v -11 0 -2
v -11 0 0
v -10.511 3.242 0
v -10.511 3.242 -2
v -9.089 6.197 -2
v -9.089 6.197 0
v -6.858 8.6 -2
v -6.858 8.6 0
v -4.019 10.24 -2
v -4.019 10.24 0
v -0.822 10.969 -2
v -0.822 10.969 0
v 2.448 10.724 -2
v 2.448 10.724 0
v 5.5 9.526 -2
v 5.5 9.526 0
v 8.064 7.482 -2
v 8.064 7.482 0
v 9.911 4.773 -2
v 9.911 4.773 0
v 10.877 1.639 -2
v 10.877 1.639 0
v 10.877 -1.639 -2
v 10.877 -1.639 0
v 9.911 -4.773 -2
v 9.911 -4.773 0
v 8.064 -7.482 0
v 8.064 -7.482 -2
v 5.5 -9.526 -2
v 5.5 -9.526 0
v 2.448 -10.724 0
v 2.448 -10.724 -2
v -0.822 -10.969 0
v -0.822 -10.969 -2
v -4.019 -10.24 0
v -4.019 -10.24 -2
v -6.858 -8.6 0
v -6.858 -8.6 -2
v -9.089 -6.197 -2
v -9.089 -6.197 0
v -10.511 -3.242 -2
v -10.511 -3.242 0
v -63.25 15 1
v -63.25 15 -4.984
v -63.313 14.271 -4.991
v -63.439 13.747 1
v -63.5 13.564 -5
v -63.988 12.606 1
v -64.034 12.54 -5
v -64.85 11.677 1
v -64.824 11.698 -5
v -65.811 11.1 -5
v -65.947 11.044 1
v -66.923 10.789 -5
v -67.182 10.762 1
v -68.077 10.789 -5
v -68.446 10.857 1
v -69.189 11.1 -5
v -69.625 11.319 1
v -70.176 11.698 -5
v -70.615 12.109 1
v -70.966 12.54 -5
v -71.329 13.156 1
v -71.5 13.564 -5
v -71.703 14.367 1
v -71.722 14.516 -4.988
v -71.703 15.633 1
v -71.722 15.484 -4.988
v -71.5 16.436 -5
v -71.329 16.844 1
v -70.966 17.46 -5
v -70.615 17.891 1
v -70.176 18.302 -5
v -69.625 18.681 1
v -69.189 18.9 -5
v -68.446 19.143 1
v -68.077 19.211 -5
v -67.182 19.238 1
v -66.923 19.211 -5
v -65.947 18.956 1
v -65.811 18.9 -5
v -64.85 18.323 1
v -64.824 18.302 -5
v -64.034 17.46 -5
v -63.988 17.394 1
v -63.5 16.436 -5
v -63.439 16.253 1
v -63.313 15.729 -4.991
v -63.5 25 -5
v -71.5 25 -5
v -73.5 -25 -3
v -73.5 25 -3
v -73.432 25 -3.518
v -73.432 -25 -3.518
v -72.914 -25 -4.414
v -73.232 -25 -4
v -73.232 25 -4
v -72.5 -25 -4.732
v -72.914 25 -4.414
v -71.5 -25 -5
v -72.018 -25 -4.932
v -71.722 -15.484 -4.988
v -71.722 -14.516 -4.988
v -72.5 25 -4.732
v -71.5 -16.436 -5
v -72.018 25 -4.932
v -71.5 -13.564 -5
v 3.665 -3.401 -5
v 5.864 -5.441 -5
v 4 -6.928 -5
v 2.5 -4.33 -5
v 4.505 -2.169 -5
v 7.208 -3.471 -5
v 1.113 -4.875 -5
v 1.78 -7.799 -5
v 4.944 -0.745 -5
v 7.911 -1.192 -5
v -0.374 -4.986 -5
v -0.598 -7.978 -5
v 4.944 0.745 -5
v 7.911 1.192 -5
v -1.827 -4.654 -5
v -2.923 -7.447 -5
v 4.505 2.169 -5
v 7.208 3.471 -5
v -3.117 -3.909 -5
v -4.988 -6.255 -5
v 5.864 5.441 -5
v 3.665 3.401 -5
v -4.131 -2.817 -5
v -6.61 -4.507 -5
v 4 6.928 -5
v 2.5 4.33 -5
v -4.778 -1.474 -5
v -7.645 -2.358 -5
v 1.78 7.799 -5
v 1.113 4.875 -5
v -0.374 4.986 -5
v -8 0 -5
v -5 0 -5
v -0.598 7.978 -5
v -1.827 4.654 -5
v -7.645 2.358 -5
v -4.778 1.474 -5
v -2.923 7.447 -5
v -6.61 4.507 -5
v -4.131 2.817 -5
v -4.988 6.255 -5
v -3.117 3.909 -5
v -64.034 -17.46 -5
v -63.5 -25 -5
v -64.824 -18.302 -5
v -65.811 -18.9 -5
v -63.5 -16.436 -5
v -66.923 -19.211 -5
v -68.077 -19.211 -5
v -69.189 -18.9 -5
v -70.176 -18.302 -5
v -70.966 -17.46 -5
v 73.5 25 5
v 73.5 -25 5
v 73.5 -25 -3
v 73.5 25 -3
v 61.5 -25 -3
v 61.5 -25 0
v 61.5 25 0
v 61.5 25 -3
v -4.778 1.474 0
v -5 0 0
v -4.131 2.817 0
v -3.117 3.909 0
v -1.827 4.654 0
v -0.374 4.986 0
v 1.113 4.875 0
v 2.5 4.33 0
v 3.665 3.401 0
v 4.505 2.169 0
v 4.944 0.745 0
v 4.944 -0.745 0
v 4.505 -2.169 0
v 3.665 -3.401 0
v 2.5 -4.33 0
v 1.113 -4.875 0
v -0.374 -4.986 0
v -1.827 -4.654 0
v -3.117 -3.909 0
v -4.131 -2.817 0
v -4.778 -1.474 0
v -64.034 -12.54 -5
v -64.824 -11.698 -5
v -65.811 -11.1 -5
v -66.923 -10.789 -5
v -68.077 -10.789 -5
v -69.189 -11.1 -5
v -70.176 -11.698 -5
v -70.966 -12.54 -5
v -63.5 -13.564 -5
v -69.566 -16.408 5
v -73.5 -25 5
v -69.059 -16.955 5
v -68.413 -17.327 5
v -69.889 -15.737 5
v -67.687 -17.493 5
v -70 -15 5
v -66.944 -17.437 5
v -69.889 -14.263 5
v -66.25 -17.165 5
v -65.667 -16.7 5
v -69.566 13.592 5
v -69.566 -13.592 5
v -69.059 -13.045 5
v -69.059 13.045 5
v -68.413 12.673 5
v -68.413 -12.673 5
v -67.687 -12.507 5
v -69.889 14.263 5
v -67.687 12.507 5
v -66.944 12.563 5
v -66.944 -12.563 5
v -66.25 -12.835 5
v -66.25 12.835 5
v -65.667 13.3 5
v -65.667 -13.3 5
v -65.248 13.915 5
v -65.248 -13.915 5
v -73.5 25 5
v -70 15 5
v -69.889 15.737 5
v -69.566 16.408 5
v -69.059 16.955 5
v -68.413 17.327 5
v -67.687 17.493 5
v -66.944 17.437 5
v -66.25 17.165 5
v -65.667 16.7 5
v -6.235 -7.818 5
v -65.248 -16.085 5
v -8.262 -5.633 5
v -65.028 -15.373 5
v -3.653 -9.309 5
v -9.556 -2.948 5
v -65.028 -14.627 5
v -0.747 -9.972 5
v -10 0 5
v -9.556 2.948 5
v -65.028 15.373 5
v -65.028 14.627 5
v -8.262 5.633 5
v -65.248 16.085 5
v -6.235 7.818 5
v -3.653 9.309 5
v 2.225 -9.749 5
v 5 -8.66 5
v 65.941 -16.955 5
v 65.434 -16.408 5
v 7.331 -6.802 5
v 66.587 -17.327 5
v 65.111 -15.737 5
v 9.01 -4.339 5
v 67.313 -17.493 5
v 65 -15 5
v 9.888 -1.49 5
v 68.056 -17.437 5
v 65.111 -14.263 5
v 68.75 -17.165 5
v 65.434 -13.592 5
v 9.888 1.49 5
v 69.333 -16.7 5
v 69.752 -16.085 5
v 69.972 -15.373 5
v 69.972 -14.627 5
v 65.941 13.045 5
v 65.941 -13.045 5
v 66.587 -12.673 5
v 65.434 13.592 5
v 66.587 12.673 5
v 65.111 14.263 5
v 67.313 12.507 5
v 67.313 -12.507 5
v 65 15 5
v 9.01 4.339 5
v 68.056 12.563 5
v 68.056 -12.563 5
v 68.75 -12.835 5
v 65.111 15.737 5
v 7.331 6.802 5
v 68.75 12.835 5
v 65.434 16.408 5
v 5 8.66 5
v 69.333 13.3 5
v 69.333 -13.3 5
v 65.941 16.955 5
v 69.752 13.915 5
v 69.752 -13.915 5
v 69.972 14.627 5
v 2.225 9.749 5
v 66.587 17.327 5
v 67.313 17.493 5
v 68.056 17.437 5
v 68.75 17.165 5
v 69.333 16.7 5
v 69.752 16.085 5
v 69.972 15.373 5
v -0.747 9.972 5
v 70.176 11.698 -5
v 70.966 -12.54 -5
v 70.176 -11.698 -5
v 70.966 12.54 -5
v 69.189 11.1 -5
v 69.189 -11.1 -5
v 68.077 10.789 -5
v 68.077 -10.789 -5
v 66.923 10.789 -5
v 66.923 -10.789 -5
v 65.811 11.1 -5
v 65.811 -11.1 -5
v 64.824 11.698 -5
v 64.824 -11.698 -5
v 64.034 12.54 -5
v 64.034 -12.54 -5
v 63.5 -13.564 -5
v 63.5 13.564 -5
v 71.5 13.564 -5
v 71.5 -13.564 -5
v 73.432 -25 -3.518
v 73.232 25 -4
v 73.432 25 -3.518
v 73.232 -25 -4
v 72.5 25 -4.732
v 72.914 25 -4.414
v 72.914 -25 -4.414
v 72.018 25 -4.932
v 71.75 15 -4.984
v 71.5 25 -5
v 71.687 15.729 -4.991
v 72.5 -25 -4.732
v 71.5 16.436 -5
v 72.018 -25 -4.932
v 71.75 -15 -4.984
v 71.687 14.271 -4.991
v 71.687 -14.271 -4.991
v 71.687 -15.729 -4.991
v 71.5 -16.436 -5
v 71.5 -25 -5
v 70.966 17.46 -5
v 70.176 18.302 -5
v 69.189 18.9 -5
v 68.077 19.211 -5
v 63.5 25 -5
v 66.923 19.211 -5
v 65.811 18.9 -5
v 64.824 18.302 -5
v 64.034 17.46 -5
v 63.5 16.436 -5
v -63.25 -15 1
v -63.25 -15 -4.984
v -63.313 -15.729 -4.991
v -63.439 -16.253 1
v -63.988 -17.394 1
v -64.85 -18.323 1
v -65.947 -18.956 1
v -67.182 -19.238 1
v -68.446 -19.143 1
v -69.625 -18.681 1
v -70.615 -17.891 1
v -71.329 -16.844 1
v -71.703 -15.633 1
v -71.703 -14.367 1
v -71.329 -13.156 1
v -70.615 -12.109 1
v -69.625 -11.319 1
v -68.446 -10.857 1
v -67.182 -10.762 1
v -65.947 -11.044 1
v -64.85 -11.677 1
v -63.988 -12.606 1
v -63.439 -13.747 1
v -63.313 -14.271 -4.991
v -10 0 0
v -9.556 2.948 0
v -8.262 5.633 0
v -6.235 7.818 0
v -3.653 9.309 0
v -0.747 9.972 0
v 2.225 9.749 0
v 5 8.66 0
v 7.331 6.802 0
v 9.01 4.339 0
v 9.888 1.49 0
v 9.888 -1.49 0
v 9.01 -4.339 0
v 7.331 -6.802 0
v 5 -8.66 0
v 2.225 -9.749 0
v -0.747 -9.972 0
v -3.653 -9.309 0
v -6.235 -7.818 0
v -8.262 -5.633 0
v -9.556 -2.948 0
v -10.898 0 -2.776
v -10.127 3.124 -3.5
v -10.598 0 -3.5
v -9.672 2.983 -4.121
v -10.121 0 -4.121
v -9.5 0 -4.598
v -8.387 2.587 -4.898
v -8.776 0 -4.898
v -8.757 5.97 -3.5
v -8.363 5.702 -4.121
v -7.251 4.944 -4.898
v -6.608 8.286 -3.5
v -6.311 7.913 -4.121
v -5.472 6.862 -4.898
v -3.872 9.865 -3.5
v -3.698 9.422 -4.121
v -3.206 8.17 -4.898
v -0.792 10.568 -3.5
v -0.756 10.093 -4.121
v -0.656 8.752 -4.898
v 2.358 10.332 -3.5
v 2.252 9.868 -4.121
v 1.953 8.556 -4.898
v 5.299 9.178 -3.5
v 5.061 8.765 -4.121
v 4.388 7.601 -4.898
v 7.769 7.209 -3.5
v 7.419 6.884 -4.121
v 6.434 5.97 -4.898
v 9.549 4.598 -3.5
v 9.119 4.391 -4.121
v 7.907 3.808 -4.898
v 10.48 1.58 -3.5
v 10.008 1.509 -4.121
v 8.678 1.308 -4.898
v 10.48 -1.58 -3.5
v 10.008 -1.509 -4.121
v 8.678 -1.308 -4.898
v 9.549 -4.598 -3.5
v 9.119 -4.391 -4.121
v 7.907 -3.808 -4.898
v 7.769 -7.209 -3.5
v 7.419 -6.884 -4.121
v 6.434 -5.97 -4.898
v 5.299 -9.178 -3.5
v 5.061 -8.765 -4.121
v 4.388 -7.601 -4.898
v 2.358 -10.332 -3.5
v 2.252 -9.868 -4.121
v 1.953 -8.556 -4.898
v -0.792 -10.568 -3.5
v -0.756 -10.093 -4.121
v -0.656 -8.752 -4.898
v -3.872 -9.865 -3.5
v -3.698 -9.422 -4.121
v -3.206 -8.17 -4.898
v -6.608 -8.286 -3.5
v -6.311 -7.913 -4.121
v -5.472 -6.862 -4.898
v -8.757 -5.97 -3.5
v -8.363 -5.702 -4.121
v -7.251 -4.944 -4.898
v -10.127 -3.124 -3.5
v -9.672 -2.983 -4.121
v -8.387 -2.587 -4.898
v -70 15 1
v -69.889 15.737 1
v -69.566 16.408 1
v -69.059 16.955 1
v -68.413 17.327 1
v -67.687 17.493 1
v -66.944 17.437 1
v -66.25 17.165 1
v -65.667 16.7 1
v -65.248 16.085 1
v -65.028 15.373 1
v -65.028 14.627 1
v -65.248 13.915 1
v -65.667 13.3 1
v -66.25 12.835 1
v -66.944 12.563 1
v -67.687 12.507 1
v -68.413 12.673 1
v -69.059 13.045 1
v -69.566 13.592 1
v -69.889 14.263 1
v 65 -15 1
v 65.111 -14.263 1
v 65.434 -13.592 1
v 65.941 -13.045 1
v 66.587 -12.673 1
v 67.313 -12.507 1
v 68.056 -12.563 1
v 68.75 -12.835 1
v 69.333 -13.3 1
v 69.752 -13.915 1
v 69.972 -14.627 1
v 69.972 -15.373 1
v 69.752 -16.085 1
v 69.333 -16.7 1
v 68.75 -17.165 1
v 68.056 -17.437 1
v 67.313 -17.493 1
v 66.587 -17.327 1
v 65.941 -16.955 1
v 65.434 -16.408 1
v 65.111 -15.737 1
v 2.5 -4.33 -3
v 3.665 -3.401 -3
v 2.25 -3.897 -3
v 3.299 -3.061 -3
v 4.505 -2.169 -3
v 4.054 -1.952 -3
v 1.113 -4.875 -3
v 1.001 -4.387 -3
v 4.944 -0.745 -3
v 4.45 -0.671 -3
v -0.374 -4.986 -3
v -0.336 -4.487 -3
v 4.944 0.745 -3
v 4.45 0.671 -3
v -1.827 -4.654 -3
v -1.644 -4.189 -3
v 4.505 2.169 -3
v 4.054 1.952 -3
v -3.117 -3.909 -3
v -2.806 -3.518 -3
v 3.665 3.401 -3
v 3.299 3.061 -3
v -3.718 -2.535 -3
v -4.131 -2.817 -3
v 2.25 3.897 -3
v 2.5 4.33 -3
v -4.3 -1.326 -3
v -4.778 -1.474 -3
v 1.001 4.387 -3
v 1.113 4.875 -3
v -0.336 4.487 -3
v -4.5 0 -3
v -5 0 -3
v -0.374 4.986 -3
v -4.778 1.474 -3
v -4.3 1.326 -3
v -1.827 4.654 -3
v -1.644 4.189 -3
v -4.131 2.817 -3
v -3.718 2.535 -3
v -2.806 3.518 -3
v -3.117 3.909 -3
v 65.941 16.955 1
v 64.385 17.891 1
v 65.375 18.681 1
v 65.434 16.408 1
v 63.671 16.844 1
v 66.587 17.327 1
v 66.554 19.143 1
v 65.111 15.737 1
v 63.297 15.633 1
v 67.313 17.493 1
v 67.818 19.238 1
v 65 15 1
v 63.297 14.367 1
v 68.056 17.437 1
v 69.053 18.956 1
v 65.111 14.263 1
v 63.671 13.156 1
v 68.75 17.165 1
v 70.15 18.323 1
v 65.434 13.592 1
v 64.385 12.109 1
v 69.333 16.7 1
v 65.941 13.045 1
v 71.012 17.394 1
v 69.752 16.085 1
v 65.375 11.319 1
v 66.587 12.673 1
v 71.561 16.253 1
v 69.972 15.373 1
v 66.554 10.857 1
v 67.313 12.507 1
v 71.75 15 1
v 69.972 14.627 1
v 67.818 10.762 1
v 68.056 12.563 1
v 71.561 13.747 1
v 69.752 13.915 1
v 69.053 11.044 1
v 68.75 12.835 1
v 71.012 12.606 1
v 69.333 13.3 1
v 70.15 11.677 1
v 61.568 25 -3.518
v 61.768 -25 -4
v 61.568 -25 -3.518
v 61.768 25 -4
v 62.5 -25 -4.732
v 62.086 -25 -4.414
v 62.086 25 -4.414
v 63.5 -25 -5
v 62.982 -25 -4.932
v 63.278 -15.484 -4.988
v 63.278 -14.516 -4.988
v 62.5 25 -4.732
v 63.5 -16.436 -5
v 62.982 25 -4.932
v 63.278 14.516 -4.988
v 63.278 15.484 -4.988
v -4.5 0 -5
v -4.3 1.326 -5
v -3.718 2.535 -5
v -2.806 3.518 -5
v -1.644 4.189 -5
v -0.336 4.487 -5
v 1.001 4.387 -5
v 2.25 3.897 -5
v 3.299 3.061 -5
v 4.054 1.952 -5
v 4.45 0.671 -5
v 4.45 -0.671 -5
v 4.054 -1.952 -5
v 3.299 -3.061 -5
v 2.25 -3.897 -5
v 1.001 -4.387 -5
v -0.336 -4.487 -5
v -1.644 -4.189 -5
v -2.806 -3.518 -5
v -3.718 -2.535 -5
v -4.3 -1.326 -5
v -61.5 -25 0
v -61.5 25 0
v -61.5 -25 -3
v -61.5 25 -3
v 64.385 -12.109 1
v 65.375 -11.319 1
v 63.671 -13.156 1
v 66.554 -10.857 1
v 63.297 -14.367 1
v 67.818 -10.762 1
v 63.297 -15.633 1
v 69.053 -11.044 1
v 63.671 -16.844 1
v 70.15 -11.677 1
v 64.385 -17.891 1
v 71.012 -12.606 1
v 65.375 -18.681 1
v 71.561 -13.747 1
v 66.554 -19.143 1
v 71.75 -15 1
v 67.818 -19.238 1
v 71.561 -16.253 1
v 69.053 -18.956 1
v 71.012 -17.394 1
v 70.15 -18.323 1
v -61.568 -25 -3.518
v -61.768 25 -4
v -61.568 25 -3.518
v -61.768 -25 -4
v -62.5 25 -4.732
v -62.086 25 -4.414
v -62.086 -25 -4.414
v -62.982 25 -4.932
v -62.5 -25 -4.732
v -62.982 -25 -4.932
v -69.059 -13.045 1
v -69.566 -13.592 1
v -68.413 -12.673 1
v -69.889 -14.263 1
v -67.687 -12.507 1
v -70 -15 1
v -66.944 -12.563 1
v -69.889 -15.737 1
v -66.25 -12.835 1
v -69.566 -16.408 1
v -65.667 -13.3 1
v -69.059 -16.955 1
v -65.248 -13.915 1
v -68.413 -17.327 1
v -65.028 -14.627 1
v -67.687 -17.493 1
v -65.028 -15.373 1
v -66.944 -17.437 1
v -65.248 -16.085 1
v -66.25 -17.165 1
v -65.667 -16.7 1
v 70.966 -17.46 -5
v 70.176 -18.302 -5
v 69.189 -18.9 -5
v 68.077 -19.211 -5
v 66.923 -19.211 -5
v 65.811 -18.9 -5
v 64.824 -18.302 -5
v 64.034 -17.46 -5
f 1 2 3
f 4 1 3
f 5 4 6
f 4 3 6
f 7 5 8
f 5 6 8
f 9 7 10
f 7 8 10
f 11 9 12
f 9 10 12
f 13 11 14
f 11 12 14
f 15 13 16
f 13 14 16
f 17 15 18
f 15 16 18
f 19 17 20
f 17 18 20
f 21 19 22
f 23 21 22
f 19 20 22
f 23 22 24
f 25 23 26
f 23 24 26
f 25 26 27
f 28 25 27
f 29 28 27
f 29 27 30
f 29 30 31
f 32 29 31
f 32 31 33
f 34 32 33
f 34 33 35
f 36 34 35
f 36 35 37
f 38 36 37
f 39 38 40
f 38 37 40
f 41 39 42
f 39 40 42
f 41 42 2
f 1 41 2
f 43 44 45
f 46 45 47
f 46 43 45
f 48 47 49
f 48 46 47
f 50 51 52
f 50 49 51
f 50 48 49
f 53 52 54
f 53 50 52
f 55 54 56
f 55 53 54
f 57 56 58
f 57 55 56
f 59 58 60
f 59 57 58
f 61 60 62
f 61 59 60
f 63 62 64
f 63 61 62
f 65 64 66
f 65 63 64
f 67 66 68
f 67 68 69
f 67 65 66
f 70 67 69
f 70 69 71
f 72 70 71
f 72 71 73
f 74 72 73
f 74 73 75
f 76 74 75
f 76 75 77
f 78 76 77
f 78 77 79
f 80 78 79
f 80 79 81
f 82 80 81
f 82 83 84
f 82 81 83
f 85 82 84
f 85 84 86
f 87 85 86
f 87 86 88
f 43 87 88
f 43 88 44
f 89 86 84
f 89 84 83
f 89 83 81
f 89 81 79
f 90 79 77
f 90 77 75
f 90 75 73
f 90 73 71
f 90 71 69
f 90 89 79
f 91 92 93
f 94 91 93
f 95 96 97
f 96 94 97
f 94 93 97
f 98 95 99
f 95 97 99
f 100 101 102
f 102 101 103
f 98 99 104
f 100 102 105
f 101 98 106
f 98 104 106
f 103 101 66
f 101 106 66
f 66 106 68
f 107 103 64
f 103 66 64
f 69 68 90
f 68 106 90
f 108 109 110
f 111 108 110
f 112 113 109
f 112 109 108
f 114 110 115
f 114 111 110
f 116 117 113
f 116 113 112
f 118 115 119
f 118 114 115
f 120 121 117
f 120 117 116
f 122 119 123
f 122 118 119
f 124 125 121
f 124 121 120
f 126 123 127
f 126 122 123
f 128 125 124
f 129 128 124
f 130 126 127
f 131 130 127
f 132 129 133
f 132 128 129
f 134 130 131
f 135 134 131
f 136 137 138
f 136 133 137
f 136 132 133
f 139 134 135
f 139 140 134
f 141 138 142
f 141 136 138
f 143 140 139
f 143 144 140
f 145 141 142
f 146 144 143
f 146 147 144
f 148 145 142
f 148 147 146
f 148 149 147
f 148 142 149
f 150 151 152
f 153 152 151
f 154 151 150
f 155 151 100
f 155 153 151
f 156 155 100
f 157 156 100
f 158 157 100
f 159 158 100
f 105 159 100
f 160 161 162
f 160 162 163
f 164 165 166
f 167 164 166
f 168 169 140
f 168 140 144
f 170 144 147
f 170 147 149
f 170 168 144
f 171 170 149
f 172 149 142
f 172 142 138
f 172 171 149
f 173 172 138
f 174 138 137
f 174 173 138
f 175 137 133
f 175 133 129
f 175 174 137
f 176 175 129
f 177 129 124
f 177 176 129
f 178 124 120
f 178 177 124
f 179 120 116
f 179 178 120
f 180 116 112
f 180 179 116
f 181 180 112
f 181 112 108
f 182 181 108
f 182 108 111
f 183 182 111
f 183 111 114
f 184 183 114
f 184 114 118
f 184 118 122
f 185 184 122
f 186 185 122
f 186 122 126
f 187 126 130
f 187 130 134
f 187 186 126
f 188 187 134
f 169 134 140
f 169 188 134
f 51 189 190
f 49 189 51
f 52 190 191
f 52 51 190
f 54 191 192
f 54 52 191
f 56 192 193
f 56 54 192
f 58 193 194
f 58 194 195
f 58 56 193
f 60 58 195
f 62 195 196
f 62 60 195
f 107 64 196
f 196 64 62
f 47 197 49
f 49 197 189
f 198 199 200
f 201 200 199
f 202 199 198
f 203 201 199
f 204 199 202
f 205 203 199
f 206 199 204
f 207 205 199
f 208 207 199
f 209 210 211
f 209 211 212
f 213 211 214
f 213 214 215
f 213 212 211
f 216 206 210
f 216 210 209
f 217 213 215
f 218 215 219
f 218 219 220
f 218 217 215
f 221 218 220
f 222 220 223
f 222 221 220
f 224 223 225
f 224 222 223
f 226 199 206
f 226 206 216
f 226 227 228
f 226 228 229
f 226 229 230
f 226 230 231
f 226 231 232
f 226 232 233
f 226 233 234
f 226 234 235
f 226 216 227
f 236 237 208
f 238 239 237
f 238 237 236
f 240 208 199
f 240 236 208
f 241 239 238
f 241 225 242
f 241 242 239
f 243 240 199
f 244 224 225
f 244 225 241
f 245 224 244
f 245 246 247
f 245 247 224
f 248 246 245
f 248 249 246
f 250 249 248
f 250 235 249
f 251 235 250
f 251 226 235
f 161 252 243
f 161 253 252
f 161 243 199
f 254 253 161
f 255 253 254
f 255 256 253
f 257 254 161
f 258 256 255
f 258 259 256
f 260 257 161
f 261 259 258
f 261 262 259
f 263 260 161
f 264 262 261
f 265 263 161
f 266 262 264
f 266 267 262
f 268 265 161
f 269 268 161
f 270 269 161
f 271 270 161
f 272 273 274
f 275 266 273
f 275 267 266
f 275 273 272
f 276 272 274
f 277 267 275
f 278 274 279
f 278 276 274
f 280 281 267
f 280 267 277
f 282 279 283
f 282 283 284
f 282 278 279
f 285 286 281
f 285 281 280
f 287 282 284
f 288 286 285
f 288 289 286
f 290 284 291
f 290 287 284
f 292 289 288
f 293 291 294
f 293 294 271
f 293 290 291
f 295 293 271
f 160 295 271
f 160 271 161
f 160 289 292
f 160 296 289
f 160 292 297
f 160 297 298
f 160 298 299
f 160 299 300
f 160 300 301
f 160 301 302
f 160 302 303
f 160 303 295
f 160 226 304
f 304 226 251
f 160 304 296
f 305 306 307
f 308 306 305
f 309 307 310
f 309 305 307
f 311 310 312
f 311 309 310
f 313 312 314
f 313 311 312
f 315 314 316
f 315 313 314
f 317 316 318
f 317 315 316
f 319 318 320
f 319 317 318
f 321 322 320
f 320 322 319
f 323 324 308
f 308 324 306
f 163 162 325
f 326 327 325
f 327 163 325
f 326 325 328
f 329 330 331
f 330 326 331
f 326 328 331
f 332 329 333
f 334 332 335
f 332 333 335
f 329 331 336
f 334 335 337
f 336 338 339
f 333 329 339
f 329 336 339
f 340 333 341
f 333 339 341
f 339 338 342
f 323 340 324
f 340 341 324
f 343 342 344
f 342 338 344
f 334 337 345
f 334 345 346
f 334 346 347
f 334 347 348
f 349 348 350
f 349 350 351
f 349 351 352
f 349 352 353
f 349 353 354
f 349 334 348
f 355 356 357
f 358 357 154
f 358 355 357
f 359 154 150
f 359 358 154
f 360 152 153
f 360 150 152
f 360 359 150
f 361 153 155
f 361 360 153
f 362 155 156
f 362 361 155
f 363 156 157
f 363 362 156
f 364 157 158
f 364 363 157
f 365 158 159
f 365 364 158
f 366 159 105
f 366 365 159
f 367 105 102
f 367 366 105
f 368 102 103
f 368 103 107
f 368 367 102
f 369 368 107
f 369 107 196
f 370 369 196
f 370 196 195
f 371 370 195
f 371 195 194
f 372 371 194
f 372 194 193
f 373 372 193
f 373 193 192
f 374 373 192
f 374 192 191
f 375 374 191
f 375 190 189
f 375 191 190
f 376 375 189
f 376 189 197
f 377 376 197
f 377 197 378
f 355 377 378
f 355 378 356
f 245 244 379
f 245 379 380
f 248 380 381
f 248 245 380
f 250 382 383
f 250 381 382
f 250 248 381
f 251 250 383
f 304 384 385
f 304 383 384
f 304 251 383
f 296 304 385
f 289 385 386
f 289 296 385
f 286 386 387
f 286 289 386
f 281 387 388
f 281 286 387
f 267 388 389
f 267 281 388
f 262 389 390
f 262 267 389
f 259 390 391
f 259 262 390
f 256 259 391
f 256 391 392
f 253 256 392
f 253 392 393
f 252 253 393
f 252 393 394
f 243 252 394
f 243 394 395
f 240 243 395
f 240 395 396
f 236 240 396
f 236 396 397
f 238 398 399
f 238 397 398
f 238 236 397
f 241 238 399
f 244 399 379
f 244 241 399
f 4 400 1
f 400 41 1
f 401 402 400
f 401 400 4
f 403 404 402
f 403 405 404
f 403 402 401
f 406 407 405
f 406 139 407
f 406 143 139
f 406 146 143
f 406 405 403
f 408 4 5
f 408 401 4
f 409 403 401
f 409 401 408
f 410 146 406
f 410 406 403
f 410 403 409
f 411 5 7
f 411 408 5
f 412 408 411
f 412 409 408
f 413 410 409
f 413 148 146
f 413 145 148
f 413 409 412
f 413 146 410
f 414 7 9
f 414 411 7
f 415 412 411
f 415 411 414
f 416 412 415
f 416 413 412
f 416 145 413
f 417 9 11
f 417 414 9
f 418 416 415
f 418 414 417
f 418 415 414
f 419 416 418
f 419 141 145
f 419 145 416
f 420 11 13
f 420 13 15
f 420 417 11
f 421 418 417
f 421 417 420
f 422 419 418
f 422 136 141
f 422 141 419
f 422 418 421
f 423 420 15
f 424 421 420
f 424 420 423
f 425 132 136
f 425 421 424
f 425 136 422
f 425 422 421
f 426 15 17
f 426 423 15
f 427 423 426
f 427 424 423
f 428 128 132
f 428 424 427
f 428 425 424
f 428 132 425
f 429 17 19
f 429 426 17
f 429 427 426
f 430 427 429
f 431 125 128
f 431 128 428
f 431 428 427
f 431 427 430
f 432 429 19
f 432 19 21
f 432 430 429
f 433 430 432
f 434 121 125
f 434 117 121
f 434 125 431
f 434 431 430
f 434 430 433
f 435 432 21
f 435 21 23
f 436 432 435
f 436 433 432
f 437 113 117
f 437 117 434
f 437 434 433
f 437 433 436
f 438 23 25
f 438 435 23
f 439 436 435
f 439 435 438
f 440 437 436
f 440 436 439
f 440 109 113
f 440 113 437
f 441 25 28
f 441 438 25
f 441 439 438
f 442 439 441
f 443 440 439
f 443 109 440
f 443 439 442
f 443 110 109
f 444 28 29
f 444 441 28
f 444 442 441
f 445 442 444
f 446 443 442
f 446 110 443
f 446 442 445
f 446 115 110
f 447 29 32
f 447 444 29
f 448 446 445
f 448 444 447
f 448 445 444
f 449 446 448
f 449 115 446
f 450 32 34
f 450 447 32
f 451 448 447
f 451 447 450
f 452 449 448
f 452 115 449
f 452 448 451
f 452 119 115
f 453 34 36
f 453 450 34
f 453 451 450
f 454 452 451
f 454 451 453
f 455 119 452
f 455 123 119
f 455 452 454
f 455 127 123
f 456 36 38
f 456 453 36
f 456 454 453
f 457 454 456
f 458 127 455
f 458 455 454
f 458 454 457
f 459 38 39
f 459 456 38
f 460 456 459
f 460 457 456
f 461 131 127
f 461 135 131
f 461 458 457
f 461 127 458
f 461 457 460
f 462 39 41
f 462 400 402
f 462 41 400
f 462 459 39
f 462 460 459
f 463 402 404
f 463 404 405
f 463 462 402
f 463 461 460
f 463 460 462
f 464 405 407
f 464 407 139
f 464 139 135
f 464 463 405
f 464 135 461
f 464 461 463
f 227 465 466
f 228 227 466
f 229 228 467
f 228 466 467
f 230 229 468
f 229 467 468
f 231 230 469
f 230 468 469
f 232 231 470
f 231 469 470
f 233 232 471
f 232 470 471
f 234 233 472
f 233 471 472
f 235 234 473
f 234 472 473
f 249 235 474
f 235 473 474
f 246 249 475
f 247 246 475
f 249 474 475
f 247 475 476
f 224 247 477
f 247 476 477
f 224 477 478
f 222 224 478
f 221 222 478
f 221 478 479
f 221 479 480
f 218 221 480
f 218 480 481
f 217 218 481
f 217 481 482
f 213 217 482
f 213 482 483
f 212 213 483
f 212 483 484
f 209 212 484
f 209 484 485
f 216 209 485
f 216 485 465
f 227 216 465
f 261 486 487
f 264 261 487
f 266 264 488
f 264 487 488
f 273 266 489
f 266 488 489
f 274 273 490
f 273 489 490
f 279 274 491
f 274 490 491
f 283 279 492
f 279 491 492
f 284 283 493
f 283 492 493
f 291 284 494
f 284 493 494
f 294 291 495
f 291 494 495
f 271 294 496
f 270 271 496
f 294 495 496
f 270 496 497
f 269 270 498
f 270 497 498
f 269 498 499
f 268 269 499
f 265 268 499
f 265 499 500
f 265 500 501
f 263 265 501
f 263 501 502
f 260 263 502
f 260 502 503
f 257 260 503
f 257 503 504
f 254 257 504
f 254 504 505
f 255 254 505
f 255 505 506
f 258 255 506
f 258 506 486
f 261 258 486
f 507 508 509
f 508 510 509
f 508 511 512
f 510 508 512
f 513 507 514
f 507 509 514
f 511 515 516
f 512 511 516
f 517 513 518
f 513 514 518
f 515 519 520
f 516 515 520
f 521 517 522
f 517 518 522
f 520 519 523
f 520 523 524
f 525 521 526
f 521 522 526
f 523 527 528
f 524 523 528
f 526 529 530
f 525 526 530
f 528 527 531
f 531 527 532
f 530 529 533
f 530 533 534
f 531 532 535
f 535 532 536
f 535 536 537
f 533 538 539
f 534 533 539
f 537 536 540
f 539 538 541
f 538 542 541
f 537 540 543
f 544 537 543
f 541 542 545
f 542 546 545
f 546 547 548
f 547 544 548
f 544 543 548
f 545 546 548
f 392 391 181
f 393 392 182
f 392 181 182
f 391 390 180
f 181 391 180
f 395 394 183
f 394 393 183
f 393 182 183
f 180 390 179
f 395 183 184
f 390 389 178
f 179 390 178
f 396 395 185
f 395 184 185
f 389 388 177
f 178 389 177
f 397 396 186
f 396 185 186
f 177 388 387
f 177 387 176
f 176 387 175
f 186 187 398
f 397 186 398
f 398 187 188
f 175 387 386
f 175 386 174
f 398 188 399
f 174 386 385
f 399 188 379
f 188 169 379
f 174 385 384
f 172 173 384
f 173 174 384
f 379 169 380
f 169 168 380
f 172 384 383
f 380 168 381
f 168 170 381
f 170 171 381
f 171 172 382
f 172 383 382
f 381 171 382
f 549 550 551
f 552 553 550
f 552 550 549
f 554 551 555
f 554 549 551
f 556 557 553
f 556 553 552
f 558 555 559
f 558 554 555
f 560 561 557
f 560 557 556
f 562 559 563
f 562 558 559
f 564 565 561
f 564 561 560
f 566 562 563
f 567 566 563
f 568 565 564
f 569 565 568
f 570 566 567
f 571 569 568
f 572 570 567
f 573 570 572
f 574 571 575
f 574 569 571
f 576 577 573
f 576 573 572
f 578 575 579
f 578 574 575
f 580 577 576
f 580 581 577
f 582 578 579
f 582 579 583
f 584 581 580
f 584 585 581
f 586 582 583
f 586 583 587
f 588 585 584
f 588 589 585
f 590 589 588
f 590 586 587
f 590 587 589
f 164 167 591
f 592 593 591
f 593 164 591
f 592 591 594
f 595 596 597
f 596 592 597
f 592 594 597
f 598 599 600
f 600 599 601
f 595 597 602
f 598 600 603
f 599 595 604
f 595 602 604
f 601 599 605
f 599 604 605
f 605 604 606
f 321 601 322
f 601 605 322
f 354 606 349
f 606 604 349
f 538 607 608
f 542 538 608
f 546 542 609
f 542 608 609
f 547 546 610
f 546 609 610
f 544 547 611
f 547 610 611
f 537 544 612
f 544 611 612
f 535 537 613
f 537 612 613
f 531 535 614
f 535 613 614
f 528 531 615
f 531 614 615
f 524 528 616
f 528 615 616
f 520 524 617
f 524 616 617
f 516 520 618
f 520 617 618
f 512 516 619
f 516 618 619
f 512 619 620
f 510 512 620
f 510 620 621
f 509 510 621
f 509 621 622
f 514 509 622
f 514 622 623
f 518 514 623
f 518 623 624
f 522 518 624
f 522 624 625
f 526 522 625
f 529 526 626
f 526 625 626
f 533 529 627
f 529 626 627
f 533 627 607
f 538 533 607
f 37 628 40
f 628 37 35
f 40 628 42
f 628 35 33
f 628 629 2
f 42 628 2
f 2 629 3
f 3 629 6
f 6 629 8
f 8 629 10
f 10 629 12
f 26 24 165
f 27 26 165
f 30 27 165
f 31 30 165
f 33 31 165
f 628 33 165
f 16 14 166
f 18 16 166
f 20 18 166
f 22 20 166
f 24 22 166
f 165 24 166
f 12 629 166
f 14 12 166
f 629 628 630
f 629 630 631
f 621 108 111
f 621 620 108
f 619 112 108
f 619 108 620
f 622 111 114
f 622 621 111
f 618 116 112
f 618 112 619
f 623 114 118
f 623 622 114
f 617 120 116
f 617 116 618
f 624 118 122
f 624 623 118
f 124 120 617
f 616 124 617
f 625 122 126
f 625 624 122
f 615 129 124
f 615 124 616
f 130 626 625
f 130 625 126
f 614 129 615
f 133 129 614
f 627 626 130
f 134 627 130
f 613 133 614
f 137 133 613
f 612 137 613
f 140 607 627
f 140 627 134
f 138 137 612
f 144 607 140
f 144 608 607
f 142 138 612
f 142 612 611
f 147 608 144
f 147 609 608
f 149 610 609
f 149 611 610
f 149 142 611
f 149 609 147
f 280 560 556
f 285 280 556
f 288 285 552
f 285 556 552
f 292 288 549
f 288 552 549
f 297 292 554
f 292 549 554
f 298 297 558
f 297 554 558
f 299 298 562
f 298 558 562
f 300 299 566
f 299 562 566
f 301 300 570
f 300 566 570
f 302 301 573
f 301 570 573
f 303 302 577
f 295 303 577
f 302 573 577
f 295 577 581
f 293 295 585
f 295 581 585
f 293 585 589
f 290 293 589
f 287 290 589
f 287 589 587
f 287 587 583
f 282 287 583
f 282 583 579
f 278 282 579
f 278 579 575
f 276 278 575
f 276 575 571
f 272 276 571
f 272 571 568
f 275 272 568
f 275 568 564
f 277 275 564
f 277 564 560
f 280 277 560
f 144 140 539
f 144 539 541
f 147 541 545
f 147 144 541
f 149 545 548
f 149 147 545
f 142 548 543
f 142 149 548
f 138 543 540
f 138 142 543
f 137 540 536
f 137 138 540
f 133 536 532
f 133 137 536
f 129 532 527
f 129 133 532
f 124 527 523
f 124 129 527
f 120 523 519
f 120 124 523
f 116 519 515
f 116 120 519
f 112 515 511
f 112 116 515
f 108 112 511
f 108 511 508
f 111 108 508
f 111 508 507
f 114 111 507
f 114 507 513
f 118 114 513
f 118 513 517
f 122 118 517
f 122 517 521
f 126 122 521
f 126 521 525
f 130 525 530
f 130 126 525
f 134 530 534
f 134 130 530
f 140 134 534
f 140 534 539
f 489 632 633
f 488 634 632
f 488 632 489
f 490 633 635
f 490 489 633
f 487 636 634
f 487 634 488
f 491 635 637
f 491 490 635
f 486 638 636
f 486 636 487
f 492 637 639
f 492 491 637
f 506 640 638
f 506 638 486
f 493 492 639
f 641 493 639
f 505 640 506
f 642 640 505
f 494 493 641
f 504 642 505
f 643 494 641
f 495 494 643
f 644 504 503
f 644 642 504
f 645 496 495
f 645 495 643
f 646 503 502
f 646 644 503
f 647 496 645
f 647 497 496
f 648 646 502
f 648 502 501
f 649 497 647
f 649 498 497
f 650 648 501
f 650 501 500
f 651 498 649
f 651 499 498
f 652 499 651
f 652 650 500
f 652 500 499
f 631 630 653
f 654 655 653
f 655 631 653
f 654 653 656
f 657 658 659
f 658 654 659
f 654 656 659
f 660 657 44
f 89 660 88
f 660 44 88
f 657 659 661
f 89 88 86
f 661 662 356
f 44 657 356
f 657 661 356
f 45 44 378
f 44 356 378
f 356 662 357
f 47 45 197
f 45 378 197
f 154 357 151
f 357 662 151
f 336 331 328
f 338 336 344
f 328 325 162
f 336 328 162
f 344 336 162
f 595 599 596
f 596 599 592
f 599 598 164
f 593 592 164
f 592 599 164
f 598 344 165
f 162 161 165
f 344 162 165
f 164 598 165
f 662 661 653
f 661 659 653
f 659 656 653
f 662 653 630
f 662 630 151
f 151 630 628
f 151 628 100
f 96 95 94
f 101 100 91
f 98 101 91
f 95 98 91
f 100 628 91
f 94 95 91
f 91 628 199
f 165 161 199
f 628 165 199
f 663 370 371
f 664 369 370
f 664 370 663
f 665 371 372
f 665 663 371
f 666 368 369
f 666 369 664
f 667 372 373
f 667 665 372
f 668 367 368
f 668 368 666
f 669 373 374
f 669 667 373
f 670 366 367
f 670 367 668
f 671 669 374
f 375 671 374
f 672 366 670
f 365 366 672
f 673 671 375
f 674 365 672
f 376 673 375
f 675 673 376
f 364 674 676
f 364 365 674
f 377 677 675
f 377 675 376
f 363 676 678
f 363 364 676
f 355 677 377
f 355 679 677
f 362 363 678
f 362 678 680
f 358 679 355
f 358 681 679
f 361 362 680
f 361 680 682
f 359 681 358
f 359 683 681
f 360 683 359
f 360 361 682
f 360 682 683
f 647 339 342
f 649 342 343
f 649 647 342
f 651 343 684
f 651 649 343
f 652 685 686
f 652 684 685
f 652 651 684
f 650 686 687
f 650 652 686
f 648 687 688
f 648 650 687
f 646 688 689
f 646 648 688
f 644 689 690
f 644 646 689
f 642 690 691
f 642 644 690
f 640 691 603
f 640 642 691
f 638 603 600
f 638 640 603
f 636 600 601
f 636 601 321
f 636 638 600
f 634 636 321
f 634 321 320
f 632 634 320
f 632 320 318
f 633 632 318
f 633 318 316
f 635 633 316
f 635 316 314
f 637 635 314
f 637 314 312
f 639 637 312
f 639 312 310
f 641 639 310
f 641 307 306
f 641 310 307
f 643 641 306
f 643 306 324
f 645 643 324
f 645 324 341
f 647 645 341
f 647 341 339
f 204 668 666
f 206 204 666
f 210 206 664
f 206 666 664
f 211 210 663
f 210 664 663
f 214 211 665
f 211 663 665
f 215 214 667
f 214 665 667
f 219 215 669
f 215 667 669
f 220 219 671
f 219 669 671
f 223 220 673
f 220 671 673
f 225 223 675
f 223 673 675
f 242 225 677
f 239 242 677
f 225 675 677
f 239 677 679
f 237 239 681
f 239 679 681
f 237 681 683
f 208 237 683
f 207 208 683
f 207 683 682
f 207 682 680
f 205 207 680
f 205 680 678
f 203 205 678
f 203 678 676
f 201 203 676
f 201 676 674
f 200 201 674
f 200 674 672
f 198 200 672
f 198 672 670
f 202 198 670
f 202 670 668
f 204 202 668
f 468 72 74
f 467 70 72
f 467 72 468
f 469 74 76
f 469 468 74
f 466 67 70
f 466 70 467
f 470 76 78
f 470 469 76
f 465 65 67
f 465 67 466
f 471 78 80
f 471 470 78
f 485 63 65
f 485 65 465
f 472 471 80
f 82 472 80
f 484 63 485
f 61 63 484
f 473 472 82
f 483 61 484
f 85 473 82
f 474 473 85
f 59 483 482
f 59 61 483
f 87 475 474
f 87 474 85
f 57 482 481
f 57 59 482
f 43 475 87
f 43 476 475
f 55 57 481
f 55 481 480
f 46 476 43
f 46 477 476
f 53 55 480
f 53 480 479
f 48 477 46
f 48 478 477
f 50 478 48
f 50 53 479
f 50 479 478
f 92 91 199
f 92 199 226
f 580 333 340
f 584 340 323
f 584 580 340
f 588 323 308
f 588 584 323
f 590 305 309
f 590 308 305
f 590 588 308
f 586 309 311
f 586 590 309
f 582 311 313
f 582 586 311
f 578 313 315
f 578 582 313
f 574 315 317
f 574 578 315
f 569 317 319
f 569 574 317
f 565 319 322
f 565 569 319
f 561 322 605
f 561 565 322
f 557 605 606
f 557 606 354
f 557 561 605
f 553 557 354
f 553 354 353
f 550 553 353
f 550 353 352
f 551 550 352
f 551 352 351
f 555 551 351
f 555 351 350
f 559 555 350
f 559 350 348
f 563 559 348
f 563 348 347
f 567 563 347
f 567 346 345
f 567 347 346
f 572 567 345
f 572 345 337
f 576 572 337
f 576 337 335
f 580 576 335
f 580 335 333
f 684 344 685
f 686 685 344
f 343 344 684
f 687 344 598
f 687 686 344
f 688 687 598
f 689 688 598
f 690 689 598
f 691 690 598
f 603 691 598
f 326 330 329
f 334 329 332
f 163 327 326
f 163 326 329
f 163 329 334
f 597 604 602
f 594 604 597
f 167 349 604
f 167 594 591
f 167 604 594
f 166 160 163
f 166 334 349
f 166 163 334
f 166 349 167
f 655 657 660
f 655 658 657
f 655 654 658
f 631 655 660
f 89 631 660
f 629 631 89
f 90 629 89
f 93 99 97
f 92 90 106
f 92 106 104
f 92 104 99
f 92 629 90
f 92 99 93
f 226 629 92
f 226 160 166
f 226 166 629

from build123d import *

# Parameters (mm, degrees)
CROQUIS1_W                 = 147
CROQUIS1_H                 = 50
SALIENTE_EXTRUIR1_DEPTH    = 5
CORTAR_EXTRUIR1_DEPTH      = 78.796208134
CORTAR_EXTRUIR1_DEPTH_BACK = 78.796208134
CROQUIS2_R                 = 10
CROQUIS3_R                 = 11
CROQUIS3_R_2               = 5
SALIENTE_EXTRUIR2_DEPTH    = 5
REDONDEO1_R                = 3
CROQUIS4_R                 = 5
CROQUIS4_R_2               = 4.5
SALIENTE_EXTRUIR3_DEPTH    = 2
CROQUIS5_W                 = 12
CROQUIS5_H                 = 50
SALIENTE_EXTRUIR4_DEPTH    = 5
CORTAR_EXTRUIR2_DEPTH      = 79.276752615
CORTAR_EXTRUIR2_DEPTH_BACK = 6
CROQUIS6_R                 = 4.25
CROQUIS7_R                 = 2.5
CORTAR_EXTRUIR3_DEPTH      = 78.866873573
REDONDEO2_R                = 2


with BuildPart() as part:
    # Croquis1 → Saliente-Extruir1 (new body)
    with BuildSketch(Plane.XY):
        Rectangle(CROQUIS1_W, CROQUIS1_H)
    extrude(amount=SALIENTE_EXTRUIR1_DEPTH)

    # Croquis2 → Cortar-Extruir1 (cut, two sides: drawn at the far end of the back side and taken through both)
    with BuildSketch(Plane(origin=(0, 0, 0), x_dir=(-1, 0, 0), z_dir=(0, 0, -1)).offset(-CORTAR_EXTRUIR1_DEPTH_BACK)):
        Circle(CROQUIS2_R)
    extrude(amount=CORTAR_EXTRUIR1_DEPTH + CORTAR_EXTRUIR1_DEPTH_BACK, mode=Mode.SUBTRACT)

    # Croquis3 → Saliente-Extruir2 (add)
    with BuildSketch(Plane(origin=(0, 0, 0), x_dir=(-1, 0, 0), z_dir=(0, 0, -1))):
        Circle(CROQUIS3_R)
        Circle(CROQUIS3_R_2, mode=Mode.SUBTRACT)
    extrude(amount=SALIENTE_EXTRUIR2_DEPTH)

    # Redondeo1
    redondeo1_edges = [part.edges().sort_by_distance(p)[0] for p in [
        (11, 0, -5),
    ]]
    fillet(redondeo1_edges, radius=REDONDEO1_R)

    # Croquis5 → Saliente-Extruir4 (add)
    with BuildSketch(Plane(origin=(0, 0, 0), x_dir=(-1, 0, 0), z_dir=(0, 0, -1))):
        with Locations((-67.5, 0)):
            Rectangle(CROQUIS5_W, CROQUIS5_H)
        with Locations((67.5, 0)):
            Rectangle(CROQUIS5_W, CROQUIS5_H)
    extrude(amount=SALIENTE_EXTRUIR4_DEPTH)

    # Croquis6 → Cortar-Extruir2 (cut, two sides: drawn at the far end of the back side and taken through both)
    with BuildSketch(Plane(origin=(0, 0, -5), x_dir=(-1, 0, 0), z_dir=(0, 0, -1)).offset(-CORTAR_EXTRUIR2_DEPTH_BACK)):
        with Locations(Location((67.5, 15, 0), (0, 0, 180))):
            Circle(CROQUIS6_R)
        with Locations(Location((67.5, -15, 0), (0, 0, 180))):
            Circle(CROQUIS6_R)
        with Locations(Location((-67.5, -15, 0), (0, 0, 180))):
            Circle(CROQUIS6_R)
        with Locations(Location((-67.5, 15, 0), (0, 0, 180))):
            Circle(CROQUIS6_R)
    extrude(amount=CORTAR_EXTRUIR2_DEPTH + CORTAR_EXTRUIR2_DEPTH_BACK, mode=Mode.SUBTRACT)

    # Croquis7 → Cortar-Extruir3 (cut, through all)
    with BuildSketch(Plane(origin=(0, 0, 1), x_dir=(-1, 0, 0), z_dir=(0, 0, -1))):
        with Locations((-67.5, 15)):
            Circle(CROQUIS7_R)
        with Locations((67.5, 15)):
            Circle(CROQUIS7_R)
        with Locations((67.5, -15)):
            Circle(CROQUIS7_R)
        with Locations((-67.5, -15)):
            Circle(CROQUIS7_R)
    extrude(amount=-CORTAR_EXTRUIR3_DEPTH, mode=Mode.SUBTRACT)

    # Redondeo2
    # the kernel refuses this fillet: 2 mm, written as the material it takes off along each edge
    with BuildSketch(Plane(origin=(73.5, -30, -5), x_dir=(0, 0, 1), z_dir=(0, 1, 0)), Plane(origin=(61.5, 30, -5), x_dir=(0, 0, 1), z_dir=(0, -1, 0)), Plane(origin=(-61.5, -30, -5), x_dir=(0, 0, 1), z_dir=(0, 1, 0))) as redondeo2_piece_1:
        with BuildLine():
            CenterArc((REDONDEO2_R, -REDONDEO2_R), REDONDEO2_R, 90, 90)
            Line((0, -REDONDEO2_R), (0, 0))
            Line((0, 0), (REDONDEO2_R, 0))
        make_face()
    extrude(amount=60, mode=Mode.SUBTRACT)
    with BuildSketch(Plane(origin=(-73.5, 30, -5), x_dir=(1, 0, 0), z_dir=(0, -1, 0))) as redondeo2_piece_2:
        with BuildLine():
            CenterArc((REDONDEO2_R, REDONDEO2_R), REDONDEO2_R, 180, 90)
            Line((0, REDONDEO2_R), (0, 0))
            Line((0, 0), (REDONDEO2_R, 0))
        make_face()
    extrude(amount=60, mode=Mode.SUBTRACT)


with BuildPart() as body_2:
    # Croquis4 → Saliente-Extruir3 (new body)
    with BuildSketch(Plane(origin=(0, 0, -5), x_dir=(-1, 0, 0), z_dir=(0, 0, -1))):
        Circle(CROQUIS4_R)
        Circle(CROQUIS4_R_2, mode=Mode.SUBTRACT)
    extrude(amount=-SALIENTE_EXTRUIR3_DEPTH)


solid = Compound([part.part, body_2.part])
